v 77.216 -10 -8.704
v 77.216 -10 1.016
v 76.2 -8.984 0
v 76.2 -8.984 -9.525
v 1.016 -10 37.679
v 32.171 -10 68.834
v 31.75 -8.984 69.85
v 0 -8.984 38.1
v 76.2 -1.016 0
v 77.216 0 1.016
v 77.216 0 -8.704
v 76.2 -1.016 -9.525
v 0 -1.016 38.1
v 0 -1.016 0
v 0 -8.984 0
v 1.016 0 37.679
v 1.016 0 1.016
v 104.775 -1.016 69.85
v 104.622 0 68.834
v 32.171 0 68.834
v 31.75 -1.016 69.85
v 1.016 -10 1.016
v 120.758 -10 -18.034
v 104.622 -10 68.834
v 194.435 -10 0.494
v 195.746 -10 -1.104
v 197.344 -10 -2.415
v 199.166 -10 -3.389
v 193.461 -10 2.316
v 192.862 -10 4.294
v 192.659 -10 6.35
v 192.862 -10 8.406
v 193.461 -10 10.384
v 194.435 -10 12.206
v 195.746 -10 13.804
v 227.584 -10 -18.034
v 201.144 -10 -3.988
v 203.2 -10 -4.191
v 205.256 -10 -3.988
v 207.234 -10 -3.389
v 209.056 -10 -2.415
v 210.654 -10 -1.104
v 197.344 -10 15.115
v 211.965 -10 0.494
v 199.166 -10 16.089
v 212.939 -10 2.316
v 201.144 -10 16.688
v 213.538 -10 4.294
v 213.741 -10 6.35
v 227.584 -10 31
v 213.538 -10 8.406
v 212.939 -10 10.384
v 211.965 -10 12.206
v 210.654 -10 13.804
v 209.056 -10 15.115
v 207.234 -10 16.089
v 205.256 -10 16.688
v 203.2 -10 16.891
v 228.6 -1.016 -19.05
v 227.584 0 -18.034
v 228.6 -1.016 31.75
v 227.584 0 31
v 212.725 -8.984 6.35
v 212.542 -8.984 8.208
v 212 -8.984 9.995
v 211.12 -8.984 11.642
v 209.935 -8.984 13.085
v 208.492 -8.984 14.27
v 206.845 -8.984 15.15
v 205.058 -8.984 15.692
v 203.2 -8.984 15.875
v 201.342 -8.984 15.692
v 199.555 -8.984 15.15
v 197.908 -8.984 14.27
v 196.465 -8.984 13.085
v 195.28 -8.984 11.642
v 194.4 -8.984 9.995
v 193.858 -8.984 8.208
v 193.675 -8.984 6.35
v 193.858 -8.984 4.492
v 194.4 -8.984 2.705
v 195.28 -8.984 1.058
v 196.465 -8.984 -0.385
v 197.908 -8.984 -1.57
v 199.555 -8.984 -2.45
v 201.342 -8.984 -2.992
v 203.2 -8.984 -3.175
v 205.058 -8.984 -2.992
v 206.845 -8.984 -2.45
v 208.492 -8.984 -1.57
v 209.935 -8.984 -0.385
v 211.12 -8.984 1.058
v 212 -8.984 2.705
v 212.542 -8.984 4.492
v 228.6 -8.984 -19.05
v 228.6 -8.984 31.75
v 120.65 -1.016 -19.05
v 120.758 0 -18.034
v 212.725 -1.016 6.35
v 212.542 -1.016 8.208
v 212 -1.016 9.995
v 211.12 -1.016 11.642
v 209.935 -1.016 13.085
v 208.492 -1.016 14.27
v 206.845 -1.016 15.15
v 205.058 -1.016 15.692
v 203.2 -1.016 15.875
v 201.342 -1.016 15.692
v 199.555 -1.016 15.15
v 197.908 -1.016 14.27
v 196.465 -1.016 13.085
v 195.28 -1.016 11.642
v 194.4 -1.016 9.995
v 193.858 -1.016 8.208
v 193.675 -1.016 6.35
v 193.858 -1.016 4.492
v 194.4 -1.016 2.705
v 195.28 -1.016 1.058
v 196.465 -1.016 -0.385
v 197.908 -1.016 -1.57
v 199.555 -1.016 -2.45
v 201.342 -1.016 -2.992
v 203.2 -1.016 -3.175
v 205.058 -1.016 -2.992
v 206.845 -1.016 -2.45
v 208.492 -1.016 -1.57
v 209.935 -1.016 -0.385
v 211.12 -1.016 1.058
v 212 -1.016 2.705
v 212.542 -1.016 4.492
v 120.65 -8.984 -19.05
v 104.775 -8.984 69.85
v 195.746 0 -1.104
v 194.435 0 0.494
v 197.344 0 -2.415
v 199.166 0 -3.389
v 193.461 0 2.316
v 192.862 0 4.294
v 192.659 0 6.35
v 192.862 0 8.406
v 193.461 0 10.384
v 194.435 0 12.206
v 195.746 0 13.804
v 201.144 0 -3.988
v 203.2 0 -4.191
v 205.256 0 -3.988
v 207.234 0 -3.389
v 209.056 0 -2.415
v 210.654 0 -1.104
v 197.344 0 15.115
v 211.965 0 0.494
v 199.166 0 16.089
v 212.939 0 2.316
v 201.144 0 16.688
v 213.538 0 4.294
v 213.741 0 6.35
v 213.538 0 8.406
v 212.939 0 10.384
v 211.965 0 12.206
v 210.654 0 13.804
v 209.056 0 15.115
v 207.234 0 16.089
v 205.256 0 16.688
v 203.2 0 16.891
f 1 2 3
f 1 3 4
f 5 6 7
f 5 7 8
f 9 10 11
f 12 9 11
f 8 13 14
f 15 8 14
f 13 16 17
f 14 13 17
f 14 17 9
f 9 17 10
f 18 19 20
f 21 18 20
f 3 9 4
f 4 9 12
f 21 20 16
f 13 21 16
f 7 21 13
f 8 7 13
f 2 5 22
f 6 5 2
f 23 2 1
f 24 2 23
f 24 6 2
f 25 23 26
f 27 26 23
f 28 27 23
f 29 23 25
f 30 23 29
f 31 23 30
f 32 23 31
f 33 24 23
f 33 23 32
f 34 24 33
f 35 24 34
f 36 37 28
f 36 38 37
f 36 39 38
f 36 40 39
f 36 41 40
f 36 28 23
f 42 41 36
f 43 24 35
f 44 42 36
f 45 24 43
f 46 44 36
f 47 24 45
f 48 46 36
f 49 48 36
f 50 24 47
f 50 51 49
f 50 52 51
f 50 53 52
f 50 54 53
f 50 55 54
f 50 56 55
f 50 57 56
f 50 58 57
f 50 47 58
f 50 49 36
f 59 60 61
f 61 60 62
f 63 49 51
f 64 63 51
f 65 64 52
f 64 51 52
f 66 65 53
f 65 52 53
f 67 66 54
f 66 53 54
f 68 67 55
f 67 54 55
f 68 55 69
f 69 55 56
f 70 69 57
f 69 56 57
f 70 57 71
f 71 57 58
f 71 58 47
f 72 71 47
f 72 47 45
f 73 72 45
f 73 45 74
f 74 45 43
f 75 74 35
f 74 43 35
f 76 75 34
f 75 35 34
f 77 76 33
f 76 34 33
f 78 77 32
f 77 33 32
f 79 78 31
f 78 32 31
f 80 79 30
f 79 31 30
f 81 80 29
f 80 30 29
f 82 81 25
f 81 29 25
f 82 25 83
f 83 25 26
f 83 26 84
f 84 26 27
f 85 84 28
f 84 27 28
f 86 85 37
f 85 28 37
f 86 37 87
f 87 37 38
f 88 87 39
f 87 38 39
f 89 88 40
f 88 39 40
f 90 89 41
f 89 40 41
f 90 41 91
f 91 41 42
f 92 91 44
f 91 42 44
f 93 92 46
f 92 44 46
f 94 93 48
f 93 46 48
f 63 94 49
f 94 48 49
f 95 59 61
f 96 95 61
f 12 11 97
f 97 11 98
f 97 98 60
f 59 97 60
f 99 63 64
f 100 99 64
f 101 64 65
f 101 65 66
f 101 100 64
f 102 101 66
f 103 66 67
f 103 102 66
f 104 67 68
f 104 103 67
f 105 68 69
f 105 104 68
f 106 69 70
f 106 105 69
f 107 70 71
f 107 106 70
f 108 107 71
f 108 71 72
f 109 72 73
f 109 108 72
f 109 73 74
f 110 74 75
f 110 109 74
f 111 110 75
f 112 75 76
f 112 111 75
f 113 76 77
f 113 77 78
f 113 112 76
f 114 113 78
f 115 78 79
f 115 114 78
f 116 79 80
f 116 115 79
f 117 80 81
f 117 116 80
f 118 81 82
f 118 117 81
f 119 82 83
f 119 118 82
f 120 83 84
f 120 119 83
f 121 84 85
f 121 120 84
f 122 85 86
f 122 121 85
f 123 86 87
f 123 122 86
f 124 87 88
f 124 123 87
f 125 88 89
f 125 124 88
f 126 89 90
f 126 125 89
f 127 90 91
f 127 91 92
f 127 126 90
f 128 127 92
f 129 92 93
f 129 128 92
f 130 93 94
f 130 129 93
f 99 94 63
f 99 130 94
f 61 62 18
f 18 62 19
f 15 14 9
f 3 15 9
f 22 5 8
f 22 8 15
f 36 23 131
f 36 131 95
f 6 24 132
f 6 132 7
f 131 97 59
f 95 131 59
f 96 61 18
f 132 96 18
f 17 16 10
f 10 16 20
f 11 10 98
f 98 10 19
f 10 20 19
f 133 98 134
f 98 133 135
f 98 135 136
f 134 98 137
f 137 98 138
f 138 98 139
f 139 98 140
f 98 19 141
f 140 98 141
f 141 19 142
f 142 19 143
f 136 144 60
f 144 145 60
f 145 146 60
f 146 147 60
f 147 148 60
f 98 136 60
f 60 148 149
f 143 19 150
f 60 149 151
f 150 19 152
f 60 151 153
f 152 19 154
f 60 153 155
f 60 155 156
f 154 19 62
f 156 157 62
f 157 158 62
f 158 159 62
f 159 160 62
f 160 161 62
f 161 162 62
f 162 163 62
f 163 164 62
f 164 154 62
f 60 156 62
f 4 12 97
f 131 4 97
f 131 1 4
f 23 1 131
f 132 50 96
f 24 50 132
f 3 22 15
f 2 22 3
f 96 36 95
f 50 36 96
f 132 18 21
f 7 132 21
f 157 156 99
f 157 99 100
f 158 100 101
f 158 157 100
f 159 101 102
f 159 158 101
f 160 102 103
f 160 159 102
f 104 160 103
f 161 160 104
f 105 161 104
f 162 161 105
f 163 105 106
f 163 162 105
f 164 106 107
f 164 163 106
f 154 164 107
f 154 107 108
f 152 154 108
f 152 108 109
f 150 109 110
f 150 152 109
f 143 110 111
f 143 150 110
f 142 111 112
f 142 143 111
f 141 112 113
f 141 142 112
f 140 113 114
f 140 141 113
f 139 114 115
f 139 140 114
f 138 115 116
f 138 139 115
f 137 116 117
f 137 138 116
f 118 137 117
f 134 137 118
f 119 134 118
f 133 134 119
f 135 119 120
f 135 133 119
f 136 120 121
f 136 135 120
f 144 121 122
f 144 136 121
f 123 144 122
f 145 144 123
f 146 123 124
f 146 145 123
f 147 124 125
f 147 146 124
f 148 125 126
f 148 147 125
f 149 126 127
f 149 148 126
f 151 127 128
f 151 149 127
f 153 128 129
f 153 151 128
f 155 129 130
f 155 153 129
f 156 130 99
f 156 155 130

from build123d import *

# Parameters (mm, degrees)
F0_R     = 9.525
F1_DEPTH = 10
F2_SIZE  = 1.016


# Not quite as in the source:
# - a feature names something its author has since deleted; it is built from what else it names


with BuildPart() as f1:
    # F0 (on Front) → F1 (new body)
    with BuildSketch(Plane.XZ):
        Polygon((0, 38.1), (0, 0), (76.2, 0), (76.2, -9.525), (120.65, -19.05), (228.6, -19.05), (228.6, 31.75), (104.775, 69.85), (31.75, 69.85), align=None)
        with Locations((203.2, 6.35)):
            Circle(F0_R, mode=Mode.SUBTRACT)
    extrude(amount=F1_DEPTH)

    # F2
    f2_edges = [f1.edges().sort_by_distance(p)[0] for p in [
        (15.875, -10, 53.975),
        (0, -10, 19.05),
        (38.1, -10, 0),
        (76.2, -10, -4.7625),
        (98.425, -10, -14.2875),
        (174.625, -10, -19.05),
        (228.6, -10, 6.35),
        (166.6875, -10, 50.8),
        (68.2625, -10, 69.85),
        (193.675, -10, 6.35),
        (15.875, 0, 53.975),
        (0, 0, 19.05),
        (38.1, 0, 0),
        (76.2, 0, -4.7625),
        (98.425, 0, -14.2875),
        (174.625, 0, -19.05),
        (228.6, 0, 6.35),
        (166.6875, 0, 50.8),
        (68.2625, 0, 69.85),
        (193.675, 0, 6.35),
    ]]
    chamfer(f2_edges, length=F2_SIZE)


solid = f1.part
